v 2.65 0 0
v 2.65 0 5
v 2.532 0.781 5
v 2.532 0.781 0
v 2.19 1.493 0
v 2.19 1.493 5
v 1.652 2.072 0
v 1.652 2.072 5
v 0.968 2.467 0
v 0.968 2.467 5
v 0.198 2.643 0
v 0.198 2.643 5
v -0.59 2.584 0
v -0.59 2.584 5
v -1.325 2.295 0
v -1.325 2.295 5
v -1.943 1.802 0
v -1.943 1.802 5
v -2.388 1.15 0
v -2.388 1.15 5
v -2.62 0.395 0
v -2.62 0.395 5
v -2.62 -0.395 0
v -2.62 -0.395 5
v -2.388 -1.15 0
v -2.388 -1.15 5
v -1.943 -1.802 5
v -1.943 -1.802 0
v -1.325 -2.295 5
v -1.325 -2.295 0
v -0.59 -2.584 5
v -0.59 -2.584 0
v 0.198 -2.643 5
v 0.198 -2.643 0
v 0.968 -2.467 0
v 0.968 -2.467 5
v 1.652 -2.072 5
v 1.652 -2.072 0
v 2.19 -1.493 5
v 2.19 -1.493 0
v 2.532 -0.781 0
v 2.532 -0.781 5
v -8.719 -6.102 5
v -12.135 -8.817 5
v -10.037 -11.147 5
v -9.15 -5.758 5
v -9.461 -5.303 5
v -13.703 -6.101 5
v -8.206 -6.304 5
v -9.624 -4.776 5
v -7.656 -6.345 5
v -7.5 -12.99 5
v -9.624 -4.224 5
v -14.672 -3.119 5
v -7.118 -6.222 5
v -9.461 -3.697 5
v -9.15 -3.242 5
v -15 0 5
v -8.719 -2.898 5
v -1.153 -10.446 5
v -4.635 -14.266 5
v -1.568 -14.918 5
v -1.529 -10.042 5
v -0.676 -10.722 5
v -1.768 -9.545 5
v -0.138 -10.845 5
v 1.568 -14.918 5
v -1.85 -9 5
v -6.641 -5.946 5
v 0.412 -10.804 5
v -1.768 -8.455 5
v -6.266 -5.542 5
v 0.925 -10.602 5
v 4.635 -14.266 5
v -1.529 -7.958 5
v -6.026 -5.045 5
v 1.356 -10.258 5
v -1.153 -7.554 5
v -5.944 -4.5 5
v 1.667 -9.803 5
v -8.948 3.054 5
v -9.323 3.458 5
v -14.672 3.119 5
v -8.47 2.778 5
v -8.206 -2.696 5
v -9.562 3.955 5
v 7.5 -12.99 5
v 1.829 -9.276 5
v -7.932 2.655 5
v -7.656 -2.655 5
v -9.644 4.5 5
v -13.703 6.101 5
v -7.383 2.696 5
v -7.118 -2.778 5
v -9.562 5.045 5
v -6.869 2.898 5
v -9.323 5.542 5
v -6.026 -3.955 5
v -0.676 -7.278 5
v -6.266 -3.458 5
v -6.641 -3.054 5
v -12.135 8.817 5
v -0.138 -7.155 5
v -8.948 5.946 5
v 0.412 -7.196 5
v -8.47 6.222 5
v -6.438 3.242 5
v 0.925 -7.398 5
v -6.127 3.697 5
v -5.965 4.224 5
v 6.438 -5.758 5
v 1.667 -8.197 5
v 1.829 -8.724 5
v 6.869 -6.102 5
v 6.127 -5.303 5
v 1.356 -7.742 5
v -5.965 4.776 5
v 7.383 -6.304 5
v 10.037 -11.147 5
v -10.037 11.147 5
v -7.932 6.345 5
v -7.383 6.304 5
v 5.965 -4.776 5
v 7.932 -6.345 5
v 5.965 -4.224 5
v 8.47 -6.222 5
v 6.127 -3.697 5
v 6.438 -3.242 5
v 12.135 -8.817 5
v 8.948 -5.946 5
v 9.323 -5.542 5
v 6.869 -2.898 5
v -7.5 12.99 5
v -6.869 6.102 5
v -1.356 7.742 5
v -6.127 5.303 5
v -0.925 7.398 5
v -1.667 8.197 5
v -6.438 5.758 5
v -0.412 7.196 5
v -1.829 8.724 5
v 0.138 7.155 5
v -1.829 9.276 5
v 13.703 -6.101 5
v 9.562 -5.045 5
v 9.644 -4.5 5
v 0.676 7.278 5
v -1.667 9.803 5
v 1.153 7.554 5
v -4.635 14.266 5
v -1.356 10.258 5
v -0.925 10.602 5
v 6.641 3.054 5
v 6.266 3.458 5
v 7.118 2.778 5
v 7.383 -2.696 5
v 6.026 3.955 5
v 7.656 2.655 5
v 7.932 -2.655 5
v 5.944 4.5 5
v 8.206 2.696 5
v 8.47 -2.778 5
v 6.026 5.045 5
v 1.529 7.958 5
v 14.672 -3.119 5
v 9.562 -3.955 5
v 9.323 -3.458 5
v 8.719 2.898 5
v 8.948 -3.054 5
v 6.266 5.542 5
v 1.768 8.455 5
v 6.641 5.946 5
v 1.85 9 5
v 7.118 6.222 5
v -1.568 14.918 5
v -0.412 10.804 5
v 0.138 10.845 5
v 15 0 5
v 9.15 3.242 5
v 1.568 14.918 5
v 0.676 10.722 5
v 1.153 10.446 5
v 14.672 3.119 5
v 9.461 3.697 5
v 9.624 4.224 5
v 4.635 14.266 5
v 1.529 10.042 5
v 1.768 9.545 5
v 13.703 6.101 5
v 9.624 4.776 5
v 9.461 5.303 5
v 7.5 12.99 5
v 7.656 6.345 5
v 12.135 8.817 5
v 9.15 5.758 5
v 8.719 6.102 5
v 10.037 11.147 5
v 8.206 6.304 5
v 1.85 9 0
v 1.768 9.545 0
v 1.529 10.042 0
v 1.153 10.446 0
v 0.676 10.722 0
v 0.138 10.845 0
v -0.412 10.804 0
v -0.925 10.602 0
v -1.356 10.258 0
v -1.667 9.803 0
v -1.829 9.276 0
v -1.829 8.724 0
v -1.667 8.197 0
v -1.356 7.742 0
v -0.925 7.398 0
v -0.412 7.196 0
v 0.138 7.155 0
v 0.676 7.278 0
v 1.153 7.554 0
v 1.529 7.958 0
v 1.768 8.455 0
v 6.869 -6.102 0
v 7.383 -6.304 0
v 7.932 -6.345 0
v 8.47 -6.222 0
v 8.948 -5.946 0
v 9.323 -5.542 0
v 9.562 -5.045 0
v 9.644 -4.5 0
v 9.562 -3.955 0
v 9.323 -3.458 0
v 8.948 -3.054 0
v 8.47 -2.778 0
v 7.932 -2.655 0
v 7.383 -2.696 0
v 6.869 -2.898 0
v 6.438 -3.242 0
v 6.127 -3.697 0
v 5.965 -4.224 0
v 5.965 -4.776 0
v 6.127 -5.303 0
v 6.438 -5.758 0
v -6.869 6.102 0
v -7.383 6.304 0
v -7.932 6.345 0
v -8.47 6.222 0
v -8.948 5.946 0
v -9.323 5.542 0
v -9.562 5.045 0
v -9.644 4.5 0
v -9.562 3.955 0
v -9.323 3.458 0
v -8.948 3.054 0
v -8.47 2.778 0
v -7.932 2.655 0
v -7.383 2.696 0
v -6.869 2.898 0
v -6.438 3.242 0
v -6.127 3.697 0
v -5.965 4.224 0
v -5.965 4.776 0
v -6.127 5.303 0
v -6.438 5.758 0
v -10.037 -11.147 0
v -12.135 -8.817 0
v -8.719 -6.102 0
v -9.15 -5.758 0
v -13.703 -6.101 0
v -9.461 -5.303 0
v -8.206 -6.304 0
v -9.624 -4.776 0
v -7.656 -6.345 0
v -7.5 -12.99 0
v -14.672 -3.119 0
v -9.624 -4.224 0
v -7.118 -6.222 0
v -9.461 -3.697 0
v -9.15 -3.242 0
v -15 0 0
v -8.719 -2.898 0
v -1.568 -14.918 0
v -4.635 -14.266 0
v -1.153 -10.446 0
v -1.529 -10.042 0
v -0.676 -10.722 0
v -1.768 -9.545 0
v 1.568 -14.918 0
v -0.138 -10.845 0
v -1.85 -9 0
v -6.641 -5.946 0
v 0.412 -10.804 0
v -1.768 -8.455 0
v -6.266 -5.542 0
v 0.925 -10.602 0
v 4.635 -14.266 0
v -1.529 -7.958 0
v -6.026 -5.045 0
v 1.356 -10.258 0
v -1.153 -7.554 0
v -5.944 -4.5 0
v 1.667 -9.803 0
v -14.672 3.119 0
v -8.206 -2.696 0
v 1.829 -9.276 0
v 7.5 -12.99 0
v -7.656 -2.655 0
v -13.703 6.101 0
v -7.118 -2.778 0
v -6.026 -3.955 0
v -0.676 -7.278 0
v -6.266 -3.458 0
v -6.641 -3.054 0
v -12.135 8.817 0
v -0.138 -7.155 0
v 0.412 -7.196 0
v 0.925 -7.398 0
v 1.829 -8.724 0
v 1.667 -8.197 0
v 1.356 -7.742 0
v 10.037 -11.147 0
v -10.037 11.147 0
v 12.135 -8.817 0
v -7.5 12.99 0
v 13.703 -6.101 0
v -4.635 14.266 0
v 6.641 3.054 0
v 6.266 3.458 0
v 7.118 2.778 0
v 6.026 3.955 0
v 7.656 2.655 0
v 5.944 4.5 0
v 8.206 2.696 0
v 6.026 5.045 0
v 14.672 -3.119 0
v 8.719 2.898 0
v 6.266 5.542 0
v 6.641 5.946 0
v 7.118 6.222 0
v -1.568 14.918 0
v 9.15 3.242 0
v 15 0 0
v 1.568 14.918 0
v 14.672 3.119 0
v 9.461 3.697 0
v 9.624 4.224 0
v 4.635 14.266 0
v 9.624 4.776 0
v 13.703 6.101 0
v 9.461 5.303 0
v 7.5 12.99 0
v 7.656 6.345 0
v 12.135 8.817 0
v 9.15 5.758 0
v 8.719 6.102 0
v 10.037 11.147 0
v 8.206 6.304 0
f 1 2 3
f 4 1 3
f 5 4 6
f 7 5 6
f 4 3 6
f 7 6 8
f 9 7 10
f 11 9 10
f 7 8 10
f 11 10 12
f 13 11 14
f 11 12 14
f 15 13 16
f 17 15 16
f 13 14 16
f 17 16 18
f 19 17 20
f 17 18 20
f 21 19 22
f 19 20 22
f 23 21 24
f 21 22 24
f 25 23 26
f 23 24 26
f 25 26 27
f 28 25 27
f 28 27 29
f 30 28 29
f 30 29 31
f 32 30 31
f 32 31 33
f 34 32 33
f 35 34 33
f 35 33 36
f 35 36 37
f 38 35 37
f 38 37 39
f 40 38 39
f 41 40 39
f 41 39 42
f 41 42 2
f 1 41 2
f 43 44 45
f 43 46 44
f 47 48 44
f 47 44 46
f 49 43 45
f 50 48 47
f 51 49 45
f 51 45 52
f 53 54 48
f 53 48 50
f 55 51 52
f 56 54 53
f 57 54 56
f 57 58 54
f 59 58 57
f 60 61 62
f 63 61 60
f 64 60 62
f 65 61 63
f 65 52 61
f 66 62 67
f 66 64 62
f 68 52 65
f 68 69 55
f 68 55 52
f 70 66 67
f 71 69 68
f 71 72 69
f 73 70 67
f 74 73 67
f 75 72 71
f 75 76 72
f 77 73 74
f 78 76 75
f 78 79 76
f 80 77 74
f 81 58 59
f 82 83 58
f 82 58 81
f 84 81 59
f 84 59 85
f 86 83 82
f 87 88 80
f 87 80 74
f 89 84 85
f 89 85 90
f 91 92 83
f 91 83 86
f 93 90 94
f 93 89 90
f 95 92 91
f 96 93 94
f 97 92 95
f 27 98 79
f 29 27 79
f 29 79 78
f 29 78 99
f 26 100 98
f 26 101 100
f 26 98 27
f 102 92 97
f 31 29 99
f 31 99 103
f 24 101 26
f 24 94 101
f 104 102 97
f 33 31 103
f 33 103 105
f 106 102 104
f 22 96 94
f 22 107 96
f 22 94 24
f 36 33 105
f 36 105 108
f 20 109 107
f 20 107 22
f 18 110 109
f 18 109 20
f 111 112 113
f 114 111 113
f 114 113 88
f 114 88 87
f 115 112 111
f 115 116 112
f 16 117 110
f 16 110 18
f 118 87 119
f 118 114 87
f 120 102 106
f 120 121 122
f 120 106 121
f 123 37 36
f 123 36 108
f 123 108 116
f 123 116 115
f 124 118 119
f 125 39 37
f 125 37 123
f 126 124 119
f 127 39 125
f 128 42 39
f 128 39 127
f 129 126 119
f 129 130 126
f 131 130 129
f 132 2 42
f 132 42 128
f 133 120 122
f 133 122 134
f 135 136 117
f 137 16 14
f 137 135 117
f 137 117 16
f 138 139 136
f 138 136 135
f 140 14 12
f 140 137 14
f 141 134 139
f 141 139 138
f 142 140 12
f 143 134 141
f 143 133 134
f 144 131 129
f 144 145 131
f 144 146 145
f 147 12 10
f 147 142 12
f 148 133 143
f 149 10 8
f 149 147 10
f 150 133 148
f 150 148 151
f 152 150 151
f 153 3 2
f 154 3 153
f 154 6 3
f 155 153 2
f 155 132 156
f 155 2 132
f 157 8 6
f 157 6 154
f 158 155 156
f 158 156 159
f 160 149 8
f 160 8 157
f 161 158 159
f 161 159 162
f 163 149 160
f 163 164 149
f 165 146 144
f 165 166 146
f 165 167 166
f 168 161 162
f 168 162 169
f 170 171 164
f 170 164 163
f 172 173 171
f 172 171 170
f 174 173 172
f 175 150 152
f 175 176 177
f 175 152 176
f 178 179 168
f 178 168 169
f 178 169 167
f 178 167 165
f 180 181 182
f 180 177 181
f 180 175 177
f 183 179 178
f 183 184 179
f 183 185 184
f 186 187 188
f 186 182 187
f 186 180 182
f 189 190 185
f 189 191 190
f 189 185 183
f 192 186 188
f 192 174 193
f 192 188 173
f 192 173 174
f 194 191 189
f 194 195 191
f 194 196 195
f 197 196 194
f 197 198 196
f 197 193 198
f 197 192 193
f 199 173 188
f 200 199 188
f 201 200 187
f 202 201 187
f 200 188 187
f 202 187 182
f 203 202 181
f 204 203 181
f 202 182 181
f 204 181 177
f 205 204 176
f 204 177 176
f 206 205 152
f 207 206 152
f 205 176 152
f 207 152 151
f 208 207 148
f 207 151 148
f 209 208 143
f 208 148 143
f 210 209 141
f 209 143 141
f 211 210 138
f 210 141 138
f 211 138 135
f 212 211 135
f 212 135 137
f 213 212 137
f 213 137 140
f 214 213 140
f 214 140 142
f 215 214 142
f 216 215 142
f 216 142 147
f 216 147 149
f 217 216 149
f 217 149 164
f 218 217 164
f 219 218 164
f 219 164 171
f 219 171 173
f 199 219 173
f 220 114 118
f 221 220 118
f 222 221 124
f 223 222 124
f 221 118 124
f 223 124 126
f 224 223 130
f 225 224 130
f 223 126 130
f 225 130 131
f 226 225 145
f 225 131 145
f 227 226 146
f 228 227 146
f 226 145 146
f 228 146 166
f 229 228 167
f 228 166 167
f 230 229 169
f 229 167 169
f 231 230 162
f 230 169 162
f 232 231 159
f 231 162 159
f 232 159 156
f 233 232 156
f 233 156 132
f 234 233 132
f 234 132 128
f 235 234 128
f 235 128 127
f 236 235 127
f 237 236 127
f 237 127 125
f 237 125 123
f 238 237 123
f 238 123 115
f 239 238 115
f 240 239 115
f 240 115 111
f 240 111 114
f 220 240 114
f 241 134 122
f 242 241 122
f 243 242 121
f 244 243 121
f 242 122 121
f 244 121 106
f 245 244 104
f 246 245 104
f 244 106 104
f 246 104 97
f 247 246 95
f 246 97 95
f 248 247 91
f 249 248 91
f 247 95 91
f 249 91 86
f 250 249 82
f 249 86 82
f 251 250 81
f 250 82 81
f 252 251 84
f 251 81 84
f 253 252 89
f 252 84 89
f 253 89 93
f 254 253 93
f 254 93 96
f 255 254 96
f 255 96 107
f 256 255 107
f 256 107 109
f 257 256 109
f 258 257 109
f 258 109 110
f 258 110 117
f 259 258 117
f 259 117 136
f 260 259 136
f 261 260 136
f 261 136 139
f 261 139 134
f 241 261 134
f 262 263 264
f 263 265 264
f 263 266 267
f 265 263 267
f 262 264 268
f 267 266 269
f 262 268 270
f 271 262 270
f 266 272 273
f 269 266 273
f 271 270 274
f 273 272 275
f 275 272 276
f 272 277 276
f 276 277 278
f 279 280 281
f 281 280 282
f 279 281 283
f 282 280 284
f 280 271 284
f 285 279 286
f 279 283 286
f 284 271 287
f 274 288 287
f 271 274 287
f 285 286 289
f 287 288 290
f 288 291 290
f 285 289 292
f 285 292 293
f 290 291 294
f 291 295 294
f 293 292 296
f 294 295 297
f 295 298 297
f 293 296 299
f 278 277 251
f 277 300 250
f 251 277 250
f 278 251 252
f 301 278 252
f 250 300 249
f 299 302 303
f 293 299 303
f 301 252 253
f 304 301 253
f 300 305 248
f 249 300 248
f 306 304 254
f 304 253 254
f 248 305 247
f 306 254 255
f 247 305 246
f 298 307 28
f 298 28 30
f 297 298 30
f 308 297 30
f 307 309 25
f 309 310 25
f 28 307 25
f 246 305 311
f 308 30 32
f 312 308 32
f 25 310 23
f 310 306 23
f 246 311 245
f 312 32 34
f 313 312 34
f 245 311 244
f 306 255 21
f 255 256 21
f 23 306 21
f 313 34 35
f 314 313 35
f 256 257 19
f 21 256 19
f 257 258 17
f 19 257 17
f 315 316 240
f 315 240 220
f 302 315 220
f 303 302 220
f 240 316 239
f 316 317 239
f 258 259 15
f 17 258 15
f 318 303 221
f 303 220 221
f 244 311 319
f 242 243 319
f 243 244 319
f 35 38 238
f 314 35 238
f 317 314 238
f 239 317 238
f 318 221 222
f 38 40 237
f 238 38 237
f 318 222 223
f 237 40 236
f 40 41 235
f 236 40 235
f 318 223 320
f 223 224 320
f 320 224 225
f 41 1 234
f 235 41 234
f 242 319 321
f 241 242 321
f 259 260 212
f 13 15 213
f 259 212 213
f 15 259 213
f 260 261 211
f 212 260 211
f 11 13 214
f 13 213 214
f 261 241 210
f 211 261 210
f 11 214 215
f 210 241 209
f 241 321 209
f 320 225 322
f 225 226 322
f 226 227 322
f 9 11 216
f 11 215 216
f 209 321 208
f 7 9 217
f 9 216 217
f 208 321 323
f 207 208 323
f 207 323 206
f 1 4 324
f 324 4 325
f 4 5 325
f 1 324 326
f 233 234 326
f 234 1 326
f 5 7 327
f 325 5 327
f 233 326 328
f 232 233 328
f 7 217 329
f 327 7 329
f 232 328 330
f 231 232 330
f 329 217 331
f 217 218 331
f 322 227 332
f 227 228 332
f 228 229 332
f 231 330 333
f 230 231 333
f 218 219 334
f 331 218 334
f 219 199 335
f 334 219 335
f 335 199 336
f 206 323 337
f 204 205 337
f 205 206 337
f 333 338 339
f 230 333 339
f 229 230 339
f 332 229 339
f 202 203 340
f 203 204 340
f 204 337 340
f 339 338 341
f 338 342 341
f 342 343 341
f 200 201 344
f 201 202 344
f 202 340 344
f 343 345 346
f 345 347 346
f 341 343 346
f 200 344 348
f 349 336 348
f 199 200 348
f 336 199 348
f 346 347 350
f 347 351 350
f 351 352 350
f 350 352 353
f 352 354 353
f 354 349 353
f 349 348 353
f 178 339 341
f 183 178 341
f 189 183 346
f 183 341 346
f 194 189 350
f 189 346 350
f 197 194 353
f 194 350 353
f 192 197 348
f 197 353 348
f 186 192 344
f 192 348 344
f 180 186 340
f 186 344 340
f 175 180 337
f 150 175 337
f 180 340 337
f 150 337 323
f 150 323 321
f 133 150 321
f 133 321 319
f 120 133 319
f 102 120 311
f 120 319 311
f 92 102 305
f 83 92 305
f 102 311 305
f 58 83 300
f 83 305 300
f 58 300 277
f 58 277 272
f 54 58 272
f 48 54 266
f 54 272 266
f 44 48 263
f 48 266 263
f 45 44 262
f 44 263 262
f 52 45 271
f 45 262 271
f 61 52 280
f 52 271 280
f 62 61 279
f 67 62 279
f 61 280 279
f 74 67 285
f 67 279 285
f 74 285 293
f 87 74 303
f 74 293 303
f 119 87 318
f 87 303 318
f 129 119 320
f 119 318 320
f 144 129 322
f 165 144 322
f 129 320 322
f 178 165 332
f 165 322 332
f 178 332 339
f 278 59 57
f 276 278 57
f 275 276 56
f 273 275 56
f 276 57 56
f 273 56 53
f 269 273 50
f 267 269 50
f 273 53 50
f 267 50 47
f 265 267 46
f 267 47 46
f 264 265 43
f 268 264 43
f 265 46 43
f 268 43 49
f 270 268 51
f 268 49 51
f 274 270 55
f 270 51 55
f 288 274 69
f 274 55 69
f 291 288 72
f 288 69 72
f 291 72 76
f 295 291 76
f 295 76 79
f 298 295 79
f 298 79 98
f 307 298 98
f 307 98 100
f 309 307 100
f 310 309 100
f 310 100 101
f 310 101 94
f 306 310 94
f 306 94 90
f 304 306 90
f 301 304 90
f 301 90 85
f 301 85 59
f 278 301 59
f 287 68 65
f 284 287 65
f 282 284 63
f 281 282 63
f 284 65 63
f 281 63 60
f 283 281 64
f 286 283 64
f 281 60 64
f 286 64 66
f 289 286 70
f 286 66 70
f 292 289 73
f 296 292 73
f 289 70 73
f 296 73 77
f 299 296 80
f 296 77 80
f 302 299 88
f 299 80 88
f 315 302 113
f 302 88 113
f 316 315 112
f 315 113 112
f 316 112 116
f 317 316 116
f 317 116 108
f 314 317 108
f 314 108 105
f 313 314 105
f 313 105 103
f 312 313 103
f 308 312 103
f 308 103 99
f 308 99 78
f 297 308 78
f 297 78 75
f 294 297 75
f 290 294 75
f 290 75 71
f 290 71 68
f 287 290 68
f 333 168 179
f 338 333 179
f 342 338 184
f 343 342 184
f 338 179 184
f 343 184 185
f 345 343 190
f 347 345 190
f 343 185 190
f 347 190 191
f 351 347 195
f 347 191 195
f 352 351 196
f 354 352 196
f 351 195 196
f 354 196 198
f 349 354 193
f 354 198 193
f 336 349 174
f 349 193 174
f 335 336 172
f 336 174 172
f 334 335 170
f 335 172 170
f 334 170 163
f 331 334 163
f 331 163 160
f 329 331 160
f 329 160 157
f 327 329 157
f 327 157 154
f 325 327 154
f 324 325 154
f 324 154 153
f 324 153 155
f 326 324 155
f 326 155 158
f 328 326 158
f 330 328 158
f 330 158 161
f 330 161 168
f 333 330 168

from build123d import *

# Parameters (mm, degrees)
SKETCH_1_R               = 15
EXTRUDE_1_DEPTH          = 5
HOLE_WIZARD_M5_1_D       = 5.3
HOLE_WIZARD_M3_5_1_D     = 3.7
PATTERN_CIRCULAR_1_COUNT = 6


with BuildPart() as part:
    # ｽｹｯﾁ1 → ﾎﾞｽ - 押し出し1 (new body)
    with BuildSketch(Plane.XY):
        Circle(SKETCH_1_R)
    extrude(amount=EXTRUDE_1_DEPTH)

    # M5 すきま穴1 (through all)
    with Locations(Plane(origin=(0, 0, 0), x_dir=(-1, 0, 0), z_dir=(0, 0, -1))):
        with Locations((0, 0)):
            Hole(HOLE_WIZARD_M5_1_D / 2)

    # M3.5 すきま穴1 (through all)
    with Locations(Plane(origin=(0, 9, 0), x_dir=(-1, 0, 0), z_dir=(0, 0, -1))):
        with Locations((0, 0)):
            hole_wizard_m3_5_1 = Hole(HOLE_WIZARD_M3_5_1_D / 2)

    # 円形ﾊﾟﾀｰﾝ1: M3.5 すきま穴1 ×6 about axis
    pattern_circular_1_axis = Axis((0, 0, 0), (0, 0, 1))
    for i in range(1, PATTERN_CIRCULAR_1_COUNT):
        add(hole_wizard_m3_5_1.rotate(pattern_circular_1_axis, i * 360 / PATTERN_CIRCULAR_1_COUNT), mode=Mode.SUBTRACT)


solid = part.part
